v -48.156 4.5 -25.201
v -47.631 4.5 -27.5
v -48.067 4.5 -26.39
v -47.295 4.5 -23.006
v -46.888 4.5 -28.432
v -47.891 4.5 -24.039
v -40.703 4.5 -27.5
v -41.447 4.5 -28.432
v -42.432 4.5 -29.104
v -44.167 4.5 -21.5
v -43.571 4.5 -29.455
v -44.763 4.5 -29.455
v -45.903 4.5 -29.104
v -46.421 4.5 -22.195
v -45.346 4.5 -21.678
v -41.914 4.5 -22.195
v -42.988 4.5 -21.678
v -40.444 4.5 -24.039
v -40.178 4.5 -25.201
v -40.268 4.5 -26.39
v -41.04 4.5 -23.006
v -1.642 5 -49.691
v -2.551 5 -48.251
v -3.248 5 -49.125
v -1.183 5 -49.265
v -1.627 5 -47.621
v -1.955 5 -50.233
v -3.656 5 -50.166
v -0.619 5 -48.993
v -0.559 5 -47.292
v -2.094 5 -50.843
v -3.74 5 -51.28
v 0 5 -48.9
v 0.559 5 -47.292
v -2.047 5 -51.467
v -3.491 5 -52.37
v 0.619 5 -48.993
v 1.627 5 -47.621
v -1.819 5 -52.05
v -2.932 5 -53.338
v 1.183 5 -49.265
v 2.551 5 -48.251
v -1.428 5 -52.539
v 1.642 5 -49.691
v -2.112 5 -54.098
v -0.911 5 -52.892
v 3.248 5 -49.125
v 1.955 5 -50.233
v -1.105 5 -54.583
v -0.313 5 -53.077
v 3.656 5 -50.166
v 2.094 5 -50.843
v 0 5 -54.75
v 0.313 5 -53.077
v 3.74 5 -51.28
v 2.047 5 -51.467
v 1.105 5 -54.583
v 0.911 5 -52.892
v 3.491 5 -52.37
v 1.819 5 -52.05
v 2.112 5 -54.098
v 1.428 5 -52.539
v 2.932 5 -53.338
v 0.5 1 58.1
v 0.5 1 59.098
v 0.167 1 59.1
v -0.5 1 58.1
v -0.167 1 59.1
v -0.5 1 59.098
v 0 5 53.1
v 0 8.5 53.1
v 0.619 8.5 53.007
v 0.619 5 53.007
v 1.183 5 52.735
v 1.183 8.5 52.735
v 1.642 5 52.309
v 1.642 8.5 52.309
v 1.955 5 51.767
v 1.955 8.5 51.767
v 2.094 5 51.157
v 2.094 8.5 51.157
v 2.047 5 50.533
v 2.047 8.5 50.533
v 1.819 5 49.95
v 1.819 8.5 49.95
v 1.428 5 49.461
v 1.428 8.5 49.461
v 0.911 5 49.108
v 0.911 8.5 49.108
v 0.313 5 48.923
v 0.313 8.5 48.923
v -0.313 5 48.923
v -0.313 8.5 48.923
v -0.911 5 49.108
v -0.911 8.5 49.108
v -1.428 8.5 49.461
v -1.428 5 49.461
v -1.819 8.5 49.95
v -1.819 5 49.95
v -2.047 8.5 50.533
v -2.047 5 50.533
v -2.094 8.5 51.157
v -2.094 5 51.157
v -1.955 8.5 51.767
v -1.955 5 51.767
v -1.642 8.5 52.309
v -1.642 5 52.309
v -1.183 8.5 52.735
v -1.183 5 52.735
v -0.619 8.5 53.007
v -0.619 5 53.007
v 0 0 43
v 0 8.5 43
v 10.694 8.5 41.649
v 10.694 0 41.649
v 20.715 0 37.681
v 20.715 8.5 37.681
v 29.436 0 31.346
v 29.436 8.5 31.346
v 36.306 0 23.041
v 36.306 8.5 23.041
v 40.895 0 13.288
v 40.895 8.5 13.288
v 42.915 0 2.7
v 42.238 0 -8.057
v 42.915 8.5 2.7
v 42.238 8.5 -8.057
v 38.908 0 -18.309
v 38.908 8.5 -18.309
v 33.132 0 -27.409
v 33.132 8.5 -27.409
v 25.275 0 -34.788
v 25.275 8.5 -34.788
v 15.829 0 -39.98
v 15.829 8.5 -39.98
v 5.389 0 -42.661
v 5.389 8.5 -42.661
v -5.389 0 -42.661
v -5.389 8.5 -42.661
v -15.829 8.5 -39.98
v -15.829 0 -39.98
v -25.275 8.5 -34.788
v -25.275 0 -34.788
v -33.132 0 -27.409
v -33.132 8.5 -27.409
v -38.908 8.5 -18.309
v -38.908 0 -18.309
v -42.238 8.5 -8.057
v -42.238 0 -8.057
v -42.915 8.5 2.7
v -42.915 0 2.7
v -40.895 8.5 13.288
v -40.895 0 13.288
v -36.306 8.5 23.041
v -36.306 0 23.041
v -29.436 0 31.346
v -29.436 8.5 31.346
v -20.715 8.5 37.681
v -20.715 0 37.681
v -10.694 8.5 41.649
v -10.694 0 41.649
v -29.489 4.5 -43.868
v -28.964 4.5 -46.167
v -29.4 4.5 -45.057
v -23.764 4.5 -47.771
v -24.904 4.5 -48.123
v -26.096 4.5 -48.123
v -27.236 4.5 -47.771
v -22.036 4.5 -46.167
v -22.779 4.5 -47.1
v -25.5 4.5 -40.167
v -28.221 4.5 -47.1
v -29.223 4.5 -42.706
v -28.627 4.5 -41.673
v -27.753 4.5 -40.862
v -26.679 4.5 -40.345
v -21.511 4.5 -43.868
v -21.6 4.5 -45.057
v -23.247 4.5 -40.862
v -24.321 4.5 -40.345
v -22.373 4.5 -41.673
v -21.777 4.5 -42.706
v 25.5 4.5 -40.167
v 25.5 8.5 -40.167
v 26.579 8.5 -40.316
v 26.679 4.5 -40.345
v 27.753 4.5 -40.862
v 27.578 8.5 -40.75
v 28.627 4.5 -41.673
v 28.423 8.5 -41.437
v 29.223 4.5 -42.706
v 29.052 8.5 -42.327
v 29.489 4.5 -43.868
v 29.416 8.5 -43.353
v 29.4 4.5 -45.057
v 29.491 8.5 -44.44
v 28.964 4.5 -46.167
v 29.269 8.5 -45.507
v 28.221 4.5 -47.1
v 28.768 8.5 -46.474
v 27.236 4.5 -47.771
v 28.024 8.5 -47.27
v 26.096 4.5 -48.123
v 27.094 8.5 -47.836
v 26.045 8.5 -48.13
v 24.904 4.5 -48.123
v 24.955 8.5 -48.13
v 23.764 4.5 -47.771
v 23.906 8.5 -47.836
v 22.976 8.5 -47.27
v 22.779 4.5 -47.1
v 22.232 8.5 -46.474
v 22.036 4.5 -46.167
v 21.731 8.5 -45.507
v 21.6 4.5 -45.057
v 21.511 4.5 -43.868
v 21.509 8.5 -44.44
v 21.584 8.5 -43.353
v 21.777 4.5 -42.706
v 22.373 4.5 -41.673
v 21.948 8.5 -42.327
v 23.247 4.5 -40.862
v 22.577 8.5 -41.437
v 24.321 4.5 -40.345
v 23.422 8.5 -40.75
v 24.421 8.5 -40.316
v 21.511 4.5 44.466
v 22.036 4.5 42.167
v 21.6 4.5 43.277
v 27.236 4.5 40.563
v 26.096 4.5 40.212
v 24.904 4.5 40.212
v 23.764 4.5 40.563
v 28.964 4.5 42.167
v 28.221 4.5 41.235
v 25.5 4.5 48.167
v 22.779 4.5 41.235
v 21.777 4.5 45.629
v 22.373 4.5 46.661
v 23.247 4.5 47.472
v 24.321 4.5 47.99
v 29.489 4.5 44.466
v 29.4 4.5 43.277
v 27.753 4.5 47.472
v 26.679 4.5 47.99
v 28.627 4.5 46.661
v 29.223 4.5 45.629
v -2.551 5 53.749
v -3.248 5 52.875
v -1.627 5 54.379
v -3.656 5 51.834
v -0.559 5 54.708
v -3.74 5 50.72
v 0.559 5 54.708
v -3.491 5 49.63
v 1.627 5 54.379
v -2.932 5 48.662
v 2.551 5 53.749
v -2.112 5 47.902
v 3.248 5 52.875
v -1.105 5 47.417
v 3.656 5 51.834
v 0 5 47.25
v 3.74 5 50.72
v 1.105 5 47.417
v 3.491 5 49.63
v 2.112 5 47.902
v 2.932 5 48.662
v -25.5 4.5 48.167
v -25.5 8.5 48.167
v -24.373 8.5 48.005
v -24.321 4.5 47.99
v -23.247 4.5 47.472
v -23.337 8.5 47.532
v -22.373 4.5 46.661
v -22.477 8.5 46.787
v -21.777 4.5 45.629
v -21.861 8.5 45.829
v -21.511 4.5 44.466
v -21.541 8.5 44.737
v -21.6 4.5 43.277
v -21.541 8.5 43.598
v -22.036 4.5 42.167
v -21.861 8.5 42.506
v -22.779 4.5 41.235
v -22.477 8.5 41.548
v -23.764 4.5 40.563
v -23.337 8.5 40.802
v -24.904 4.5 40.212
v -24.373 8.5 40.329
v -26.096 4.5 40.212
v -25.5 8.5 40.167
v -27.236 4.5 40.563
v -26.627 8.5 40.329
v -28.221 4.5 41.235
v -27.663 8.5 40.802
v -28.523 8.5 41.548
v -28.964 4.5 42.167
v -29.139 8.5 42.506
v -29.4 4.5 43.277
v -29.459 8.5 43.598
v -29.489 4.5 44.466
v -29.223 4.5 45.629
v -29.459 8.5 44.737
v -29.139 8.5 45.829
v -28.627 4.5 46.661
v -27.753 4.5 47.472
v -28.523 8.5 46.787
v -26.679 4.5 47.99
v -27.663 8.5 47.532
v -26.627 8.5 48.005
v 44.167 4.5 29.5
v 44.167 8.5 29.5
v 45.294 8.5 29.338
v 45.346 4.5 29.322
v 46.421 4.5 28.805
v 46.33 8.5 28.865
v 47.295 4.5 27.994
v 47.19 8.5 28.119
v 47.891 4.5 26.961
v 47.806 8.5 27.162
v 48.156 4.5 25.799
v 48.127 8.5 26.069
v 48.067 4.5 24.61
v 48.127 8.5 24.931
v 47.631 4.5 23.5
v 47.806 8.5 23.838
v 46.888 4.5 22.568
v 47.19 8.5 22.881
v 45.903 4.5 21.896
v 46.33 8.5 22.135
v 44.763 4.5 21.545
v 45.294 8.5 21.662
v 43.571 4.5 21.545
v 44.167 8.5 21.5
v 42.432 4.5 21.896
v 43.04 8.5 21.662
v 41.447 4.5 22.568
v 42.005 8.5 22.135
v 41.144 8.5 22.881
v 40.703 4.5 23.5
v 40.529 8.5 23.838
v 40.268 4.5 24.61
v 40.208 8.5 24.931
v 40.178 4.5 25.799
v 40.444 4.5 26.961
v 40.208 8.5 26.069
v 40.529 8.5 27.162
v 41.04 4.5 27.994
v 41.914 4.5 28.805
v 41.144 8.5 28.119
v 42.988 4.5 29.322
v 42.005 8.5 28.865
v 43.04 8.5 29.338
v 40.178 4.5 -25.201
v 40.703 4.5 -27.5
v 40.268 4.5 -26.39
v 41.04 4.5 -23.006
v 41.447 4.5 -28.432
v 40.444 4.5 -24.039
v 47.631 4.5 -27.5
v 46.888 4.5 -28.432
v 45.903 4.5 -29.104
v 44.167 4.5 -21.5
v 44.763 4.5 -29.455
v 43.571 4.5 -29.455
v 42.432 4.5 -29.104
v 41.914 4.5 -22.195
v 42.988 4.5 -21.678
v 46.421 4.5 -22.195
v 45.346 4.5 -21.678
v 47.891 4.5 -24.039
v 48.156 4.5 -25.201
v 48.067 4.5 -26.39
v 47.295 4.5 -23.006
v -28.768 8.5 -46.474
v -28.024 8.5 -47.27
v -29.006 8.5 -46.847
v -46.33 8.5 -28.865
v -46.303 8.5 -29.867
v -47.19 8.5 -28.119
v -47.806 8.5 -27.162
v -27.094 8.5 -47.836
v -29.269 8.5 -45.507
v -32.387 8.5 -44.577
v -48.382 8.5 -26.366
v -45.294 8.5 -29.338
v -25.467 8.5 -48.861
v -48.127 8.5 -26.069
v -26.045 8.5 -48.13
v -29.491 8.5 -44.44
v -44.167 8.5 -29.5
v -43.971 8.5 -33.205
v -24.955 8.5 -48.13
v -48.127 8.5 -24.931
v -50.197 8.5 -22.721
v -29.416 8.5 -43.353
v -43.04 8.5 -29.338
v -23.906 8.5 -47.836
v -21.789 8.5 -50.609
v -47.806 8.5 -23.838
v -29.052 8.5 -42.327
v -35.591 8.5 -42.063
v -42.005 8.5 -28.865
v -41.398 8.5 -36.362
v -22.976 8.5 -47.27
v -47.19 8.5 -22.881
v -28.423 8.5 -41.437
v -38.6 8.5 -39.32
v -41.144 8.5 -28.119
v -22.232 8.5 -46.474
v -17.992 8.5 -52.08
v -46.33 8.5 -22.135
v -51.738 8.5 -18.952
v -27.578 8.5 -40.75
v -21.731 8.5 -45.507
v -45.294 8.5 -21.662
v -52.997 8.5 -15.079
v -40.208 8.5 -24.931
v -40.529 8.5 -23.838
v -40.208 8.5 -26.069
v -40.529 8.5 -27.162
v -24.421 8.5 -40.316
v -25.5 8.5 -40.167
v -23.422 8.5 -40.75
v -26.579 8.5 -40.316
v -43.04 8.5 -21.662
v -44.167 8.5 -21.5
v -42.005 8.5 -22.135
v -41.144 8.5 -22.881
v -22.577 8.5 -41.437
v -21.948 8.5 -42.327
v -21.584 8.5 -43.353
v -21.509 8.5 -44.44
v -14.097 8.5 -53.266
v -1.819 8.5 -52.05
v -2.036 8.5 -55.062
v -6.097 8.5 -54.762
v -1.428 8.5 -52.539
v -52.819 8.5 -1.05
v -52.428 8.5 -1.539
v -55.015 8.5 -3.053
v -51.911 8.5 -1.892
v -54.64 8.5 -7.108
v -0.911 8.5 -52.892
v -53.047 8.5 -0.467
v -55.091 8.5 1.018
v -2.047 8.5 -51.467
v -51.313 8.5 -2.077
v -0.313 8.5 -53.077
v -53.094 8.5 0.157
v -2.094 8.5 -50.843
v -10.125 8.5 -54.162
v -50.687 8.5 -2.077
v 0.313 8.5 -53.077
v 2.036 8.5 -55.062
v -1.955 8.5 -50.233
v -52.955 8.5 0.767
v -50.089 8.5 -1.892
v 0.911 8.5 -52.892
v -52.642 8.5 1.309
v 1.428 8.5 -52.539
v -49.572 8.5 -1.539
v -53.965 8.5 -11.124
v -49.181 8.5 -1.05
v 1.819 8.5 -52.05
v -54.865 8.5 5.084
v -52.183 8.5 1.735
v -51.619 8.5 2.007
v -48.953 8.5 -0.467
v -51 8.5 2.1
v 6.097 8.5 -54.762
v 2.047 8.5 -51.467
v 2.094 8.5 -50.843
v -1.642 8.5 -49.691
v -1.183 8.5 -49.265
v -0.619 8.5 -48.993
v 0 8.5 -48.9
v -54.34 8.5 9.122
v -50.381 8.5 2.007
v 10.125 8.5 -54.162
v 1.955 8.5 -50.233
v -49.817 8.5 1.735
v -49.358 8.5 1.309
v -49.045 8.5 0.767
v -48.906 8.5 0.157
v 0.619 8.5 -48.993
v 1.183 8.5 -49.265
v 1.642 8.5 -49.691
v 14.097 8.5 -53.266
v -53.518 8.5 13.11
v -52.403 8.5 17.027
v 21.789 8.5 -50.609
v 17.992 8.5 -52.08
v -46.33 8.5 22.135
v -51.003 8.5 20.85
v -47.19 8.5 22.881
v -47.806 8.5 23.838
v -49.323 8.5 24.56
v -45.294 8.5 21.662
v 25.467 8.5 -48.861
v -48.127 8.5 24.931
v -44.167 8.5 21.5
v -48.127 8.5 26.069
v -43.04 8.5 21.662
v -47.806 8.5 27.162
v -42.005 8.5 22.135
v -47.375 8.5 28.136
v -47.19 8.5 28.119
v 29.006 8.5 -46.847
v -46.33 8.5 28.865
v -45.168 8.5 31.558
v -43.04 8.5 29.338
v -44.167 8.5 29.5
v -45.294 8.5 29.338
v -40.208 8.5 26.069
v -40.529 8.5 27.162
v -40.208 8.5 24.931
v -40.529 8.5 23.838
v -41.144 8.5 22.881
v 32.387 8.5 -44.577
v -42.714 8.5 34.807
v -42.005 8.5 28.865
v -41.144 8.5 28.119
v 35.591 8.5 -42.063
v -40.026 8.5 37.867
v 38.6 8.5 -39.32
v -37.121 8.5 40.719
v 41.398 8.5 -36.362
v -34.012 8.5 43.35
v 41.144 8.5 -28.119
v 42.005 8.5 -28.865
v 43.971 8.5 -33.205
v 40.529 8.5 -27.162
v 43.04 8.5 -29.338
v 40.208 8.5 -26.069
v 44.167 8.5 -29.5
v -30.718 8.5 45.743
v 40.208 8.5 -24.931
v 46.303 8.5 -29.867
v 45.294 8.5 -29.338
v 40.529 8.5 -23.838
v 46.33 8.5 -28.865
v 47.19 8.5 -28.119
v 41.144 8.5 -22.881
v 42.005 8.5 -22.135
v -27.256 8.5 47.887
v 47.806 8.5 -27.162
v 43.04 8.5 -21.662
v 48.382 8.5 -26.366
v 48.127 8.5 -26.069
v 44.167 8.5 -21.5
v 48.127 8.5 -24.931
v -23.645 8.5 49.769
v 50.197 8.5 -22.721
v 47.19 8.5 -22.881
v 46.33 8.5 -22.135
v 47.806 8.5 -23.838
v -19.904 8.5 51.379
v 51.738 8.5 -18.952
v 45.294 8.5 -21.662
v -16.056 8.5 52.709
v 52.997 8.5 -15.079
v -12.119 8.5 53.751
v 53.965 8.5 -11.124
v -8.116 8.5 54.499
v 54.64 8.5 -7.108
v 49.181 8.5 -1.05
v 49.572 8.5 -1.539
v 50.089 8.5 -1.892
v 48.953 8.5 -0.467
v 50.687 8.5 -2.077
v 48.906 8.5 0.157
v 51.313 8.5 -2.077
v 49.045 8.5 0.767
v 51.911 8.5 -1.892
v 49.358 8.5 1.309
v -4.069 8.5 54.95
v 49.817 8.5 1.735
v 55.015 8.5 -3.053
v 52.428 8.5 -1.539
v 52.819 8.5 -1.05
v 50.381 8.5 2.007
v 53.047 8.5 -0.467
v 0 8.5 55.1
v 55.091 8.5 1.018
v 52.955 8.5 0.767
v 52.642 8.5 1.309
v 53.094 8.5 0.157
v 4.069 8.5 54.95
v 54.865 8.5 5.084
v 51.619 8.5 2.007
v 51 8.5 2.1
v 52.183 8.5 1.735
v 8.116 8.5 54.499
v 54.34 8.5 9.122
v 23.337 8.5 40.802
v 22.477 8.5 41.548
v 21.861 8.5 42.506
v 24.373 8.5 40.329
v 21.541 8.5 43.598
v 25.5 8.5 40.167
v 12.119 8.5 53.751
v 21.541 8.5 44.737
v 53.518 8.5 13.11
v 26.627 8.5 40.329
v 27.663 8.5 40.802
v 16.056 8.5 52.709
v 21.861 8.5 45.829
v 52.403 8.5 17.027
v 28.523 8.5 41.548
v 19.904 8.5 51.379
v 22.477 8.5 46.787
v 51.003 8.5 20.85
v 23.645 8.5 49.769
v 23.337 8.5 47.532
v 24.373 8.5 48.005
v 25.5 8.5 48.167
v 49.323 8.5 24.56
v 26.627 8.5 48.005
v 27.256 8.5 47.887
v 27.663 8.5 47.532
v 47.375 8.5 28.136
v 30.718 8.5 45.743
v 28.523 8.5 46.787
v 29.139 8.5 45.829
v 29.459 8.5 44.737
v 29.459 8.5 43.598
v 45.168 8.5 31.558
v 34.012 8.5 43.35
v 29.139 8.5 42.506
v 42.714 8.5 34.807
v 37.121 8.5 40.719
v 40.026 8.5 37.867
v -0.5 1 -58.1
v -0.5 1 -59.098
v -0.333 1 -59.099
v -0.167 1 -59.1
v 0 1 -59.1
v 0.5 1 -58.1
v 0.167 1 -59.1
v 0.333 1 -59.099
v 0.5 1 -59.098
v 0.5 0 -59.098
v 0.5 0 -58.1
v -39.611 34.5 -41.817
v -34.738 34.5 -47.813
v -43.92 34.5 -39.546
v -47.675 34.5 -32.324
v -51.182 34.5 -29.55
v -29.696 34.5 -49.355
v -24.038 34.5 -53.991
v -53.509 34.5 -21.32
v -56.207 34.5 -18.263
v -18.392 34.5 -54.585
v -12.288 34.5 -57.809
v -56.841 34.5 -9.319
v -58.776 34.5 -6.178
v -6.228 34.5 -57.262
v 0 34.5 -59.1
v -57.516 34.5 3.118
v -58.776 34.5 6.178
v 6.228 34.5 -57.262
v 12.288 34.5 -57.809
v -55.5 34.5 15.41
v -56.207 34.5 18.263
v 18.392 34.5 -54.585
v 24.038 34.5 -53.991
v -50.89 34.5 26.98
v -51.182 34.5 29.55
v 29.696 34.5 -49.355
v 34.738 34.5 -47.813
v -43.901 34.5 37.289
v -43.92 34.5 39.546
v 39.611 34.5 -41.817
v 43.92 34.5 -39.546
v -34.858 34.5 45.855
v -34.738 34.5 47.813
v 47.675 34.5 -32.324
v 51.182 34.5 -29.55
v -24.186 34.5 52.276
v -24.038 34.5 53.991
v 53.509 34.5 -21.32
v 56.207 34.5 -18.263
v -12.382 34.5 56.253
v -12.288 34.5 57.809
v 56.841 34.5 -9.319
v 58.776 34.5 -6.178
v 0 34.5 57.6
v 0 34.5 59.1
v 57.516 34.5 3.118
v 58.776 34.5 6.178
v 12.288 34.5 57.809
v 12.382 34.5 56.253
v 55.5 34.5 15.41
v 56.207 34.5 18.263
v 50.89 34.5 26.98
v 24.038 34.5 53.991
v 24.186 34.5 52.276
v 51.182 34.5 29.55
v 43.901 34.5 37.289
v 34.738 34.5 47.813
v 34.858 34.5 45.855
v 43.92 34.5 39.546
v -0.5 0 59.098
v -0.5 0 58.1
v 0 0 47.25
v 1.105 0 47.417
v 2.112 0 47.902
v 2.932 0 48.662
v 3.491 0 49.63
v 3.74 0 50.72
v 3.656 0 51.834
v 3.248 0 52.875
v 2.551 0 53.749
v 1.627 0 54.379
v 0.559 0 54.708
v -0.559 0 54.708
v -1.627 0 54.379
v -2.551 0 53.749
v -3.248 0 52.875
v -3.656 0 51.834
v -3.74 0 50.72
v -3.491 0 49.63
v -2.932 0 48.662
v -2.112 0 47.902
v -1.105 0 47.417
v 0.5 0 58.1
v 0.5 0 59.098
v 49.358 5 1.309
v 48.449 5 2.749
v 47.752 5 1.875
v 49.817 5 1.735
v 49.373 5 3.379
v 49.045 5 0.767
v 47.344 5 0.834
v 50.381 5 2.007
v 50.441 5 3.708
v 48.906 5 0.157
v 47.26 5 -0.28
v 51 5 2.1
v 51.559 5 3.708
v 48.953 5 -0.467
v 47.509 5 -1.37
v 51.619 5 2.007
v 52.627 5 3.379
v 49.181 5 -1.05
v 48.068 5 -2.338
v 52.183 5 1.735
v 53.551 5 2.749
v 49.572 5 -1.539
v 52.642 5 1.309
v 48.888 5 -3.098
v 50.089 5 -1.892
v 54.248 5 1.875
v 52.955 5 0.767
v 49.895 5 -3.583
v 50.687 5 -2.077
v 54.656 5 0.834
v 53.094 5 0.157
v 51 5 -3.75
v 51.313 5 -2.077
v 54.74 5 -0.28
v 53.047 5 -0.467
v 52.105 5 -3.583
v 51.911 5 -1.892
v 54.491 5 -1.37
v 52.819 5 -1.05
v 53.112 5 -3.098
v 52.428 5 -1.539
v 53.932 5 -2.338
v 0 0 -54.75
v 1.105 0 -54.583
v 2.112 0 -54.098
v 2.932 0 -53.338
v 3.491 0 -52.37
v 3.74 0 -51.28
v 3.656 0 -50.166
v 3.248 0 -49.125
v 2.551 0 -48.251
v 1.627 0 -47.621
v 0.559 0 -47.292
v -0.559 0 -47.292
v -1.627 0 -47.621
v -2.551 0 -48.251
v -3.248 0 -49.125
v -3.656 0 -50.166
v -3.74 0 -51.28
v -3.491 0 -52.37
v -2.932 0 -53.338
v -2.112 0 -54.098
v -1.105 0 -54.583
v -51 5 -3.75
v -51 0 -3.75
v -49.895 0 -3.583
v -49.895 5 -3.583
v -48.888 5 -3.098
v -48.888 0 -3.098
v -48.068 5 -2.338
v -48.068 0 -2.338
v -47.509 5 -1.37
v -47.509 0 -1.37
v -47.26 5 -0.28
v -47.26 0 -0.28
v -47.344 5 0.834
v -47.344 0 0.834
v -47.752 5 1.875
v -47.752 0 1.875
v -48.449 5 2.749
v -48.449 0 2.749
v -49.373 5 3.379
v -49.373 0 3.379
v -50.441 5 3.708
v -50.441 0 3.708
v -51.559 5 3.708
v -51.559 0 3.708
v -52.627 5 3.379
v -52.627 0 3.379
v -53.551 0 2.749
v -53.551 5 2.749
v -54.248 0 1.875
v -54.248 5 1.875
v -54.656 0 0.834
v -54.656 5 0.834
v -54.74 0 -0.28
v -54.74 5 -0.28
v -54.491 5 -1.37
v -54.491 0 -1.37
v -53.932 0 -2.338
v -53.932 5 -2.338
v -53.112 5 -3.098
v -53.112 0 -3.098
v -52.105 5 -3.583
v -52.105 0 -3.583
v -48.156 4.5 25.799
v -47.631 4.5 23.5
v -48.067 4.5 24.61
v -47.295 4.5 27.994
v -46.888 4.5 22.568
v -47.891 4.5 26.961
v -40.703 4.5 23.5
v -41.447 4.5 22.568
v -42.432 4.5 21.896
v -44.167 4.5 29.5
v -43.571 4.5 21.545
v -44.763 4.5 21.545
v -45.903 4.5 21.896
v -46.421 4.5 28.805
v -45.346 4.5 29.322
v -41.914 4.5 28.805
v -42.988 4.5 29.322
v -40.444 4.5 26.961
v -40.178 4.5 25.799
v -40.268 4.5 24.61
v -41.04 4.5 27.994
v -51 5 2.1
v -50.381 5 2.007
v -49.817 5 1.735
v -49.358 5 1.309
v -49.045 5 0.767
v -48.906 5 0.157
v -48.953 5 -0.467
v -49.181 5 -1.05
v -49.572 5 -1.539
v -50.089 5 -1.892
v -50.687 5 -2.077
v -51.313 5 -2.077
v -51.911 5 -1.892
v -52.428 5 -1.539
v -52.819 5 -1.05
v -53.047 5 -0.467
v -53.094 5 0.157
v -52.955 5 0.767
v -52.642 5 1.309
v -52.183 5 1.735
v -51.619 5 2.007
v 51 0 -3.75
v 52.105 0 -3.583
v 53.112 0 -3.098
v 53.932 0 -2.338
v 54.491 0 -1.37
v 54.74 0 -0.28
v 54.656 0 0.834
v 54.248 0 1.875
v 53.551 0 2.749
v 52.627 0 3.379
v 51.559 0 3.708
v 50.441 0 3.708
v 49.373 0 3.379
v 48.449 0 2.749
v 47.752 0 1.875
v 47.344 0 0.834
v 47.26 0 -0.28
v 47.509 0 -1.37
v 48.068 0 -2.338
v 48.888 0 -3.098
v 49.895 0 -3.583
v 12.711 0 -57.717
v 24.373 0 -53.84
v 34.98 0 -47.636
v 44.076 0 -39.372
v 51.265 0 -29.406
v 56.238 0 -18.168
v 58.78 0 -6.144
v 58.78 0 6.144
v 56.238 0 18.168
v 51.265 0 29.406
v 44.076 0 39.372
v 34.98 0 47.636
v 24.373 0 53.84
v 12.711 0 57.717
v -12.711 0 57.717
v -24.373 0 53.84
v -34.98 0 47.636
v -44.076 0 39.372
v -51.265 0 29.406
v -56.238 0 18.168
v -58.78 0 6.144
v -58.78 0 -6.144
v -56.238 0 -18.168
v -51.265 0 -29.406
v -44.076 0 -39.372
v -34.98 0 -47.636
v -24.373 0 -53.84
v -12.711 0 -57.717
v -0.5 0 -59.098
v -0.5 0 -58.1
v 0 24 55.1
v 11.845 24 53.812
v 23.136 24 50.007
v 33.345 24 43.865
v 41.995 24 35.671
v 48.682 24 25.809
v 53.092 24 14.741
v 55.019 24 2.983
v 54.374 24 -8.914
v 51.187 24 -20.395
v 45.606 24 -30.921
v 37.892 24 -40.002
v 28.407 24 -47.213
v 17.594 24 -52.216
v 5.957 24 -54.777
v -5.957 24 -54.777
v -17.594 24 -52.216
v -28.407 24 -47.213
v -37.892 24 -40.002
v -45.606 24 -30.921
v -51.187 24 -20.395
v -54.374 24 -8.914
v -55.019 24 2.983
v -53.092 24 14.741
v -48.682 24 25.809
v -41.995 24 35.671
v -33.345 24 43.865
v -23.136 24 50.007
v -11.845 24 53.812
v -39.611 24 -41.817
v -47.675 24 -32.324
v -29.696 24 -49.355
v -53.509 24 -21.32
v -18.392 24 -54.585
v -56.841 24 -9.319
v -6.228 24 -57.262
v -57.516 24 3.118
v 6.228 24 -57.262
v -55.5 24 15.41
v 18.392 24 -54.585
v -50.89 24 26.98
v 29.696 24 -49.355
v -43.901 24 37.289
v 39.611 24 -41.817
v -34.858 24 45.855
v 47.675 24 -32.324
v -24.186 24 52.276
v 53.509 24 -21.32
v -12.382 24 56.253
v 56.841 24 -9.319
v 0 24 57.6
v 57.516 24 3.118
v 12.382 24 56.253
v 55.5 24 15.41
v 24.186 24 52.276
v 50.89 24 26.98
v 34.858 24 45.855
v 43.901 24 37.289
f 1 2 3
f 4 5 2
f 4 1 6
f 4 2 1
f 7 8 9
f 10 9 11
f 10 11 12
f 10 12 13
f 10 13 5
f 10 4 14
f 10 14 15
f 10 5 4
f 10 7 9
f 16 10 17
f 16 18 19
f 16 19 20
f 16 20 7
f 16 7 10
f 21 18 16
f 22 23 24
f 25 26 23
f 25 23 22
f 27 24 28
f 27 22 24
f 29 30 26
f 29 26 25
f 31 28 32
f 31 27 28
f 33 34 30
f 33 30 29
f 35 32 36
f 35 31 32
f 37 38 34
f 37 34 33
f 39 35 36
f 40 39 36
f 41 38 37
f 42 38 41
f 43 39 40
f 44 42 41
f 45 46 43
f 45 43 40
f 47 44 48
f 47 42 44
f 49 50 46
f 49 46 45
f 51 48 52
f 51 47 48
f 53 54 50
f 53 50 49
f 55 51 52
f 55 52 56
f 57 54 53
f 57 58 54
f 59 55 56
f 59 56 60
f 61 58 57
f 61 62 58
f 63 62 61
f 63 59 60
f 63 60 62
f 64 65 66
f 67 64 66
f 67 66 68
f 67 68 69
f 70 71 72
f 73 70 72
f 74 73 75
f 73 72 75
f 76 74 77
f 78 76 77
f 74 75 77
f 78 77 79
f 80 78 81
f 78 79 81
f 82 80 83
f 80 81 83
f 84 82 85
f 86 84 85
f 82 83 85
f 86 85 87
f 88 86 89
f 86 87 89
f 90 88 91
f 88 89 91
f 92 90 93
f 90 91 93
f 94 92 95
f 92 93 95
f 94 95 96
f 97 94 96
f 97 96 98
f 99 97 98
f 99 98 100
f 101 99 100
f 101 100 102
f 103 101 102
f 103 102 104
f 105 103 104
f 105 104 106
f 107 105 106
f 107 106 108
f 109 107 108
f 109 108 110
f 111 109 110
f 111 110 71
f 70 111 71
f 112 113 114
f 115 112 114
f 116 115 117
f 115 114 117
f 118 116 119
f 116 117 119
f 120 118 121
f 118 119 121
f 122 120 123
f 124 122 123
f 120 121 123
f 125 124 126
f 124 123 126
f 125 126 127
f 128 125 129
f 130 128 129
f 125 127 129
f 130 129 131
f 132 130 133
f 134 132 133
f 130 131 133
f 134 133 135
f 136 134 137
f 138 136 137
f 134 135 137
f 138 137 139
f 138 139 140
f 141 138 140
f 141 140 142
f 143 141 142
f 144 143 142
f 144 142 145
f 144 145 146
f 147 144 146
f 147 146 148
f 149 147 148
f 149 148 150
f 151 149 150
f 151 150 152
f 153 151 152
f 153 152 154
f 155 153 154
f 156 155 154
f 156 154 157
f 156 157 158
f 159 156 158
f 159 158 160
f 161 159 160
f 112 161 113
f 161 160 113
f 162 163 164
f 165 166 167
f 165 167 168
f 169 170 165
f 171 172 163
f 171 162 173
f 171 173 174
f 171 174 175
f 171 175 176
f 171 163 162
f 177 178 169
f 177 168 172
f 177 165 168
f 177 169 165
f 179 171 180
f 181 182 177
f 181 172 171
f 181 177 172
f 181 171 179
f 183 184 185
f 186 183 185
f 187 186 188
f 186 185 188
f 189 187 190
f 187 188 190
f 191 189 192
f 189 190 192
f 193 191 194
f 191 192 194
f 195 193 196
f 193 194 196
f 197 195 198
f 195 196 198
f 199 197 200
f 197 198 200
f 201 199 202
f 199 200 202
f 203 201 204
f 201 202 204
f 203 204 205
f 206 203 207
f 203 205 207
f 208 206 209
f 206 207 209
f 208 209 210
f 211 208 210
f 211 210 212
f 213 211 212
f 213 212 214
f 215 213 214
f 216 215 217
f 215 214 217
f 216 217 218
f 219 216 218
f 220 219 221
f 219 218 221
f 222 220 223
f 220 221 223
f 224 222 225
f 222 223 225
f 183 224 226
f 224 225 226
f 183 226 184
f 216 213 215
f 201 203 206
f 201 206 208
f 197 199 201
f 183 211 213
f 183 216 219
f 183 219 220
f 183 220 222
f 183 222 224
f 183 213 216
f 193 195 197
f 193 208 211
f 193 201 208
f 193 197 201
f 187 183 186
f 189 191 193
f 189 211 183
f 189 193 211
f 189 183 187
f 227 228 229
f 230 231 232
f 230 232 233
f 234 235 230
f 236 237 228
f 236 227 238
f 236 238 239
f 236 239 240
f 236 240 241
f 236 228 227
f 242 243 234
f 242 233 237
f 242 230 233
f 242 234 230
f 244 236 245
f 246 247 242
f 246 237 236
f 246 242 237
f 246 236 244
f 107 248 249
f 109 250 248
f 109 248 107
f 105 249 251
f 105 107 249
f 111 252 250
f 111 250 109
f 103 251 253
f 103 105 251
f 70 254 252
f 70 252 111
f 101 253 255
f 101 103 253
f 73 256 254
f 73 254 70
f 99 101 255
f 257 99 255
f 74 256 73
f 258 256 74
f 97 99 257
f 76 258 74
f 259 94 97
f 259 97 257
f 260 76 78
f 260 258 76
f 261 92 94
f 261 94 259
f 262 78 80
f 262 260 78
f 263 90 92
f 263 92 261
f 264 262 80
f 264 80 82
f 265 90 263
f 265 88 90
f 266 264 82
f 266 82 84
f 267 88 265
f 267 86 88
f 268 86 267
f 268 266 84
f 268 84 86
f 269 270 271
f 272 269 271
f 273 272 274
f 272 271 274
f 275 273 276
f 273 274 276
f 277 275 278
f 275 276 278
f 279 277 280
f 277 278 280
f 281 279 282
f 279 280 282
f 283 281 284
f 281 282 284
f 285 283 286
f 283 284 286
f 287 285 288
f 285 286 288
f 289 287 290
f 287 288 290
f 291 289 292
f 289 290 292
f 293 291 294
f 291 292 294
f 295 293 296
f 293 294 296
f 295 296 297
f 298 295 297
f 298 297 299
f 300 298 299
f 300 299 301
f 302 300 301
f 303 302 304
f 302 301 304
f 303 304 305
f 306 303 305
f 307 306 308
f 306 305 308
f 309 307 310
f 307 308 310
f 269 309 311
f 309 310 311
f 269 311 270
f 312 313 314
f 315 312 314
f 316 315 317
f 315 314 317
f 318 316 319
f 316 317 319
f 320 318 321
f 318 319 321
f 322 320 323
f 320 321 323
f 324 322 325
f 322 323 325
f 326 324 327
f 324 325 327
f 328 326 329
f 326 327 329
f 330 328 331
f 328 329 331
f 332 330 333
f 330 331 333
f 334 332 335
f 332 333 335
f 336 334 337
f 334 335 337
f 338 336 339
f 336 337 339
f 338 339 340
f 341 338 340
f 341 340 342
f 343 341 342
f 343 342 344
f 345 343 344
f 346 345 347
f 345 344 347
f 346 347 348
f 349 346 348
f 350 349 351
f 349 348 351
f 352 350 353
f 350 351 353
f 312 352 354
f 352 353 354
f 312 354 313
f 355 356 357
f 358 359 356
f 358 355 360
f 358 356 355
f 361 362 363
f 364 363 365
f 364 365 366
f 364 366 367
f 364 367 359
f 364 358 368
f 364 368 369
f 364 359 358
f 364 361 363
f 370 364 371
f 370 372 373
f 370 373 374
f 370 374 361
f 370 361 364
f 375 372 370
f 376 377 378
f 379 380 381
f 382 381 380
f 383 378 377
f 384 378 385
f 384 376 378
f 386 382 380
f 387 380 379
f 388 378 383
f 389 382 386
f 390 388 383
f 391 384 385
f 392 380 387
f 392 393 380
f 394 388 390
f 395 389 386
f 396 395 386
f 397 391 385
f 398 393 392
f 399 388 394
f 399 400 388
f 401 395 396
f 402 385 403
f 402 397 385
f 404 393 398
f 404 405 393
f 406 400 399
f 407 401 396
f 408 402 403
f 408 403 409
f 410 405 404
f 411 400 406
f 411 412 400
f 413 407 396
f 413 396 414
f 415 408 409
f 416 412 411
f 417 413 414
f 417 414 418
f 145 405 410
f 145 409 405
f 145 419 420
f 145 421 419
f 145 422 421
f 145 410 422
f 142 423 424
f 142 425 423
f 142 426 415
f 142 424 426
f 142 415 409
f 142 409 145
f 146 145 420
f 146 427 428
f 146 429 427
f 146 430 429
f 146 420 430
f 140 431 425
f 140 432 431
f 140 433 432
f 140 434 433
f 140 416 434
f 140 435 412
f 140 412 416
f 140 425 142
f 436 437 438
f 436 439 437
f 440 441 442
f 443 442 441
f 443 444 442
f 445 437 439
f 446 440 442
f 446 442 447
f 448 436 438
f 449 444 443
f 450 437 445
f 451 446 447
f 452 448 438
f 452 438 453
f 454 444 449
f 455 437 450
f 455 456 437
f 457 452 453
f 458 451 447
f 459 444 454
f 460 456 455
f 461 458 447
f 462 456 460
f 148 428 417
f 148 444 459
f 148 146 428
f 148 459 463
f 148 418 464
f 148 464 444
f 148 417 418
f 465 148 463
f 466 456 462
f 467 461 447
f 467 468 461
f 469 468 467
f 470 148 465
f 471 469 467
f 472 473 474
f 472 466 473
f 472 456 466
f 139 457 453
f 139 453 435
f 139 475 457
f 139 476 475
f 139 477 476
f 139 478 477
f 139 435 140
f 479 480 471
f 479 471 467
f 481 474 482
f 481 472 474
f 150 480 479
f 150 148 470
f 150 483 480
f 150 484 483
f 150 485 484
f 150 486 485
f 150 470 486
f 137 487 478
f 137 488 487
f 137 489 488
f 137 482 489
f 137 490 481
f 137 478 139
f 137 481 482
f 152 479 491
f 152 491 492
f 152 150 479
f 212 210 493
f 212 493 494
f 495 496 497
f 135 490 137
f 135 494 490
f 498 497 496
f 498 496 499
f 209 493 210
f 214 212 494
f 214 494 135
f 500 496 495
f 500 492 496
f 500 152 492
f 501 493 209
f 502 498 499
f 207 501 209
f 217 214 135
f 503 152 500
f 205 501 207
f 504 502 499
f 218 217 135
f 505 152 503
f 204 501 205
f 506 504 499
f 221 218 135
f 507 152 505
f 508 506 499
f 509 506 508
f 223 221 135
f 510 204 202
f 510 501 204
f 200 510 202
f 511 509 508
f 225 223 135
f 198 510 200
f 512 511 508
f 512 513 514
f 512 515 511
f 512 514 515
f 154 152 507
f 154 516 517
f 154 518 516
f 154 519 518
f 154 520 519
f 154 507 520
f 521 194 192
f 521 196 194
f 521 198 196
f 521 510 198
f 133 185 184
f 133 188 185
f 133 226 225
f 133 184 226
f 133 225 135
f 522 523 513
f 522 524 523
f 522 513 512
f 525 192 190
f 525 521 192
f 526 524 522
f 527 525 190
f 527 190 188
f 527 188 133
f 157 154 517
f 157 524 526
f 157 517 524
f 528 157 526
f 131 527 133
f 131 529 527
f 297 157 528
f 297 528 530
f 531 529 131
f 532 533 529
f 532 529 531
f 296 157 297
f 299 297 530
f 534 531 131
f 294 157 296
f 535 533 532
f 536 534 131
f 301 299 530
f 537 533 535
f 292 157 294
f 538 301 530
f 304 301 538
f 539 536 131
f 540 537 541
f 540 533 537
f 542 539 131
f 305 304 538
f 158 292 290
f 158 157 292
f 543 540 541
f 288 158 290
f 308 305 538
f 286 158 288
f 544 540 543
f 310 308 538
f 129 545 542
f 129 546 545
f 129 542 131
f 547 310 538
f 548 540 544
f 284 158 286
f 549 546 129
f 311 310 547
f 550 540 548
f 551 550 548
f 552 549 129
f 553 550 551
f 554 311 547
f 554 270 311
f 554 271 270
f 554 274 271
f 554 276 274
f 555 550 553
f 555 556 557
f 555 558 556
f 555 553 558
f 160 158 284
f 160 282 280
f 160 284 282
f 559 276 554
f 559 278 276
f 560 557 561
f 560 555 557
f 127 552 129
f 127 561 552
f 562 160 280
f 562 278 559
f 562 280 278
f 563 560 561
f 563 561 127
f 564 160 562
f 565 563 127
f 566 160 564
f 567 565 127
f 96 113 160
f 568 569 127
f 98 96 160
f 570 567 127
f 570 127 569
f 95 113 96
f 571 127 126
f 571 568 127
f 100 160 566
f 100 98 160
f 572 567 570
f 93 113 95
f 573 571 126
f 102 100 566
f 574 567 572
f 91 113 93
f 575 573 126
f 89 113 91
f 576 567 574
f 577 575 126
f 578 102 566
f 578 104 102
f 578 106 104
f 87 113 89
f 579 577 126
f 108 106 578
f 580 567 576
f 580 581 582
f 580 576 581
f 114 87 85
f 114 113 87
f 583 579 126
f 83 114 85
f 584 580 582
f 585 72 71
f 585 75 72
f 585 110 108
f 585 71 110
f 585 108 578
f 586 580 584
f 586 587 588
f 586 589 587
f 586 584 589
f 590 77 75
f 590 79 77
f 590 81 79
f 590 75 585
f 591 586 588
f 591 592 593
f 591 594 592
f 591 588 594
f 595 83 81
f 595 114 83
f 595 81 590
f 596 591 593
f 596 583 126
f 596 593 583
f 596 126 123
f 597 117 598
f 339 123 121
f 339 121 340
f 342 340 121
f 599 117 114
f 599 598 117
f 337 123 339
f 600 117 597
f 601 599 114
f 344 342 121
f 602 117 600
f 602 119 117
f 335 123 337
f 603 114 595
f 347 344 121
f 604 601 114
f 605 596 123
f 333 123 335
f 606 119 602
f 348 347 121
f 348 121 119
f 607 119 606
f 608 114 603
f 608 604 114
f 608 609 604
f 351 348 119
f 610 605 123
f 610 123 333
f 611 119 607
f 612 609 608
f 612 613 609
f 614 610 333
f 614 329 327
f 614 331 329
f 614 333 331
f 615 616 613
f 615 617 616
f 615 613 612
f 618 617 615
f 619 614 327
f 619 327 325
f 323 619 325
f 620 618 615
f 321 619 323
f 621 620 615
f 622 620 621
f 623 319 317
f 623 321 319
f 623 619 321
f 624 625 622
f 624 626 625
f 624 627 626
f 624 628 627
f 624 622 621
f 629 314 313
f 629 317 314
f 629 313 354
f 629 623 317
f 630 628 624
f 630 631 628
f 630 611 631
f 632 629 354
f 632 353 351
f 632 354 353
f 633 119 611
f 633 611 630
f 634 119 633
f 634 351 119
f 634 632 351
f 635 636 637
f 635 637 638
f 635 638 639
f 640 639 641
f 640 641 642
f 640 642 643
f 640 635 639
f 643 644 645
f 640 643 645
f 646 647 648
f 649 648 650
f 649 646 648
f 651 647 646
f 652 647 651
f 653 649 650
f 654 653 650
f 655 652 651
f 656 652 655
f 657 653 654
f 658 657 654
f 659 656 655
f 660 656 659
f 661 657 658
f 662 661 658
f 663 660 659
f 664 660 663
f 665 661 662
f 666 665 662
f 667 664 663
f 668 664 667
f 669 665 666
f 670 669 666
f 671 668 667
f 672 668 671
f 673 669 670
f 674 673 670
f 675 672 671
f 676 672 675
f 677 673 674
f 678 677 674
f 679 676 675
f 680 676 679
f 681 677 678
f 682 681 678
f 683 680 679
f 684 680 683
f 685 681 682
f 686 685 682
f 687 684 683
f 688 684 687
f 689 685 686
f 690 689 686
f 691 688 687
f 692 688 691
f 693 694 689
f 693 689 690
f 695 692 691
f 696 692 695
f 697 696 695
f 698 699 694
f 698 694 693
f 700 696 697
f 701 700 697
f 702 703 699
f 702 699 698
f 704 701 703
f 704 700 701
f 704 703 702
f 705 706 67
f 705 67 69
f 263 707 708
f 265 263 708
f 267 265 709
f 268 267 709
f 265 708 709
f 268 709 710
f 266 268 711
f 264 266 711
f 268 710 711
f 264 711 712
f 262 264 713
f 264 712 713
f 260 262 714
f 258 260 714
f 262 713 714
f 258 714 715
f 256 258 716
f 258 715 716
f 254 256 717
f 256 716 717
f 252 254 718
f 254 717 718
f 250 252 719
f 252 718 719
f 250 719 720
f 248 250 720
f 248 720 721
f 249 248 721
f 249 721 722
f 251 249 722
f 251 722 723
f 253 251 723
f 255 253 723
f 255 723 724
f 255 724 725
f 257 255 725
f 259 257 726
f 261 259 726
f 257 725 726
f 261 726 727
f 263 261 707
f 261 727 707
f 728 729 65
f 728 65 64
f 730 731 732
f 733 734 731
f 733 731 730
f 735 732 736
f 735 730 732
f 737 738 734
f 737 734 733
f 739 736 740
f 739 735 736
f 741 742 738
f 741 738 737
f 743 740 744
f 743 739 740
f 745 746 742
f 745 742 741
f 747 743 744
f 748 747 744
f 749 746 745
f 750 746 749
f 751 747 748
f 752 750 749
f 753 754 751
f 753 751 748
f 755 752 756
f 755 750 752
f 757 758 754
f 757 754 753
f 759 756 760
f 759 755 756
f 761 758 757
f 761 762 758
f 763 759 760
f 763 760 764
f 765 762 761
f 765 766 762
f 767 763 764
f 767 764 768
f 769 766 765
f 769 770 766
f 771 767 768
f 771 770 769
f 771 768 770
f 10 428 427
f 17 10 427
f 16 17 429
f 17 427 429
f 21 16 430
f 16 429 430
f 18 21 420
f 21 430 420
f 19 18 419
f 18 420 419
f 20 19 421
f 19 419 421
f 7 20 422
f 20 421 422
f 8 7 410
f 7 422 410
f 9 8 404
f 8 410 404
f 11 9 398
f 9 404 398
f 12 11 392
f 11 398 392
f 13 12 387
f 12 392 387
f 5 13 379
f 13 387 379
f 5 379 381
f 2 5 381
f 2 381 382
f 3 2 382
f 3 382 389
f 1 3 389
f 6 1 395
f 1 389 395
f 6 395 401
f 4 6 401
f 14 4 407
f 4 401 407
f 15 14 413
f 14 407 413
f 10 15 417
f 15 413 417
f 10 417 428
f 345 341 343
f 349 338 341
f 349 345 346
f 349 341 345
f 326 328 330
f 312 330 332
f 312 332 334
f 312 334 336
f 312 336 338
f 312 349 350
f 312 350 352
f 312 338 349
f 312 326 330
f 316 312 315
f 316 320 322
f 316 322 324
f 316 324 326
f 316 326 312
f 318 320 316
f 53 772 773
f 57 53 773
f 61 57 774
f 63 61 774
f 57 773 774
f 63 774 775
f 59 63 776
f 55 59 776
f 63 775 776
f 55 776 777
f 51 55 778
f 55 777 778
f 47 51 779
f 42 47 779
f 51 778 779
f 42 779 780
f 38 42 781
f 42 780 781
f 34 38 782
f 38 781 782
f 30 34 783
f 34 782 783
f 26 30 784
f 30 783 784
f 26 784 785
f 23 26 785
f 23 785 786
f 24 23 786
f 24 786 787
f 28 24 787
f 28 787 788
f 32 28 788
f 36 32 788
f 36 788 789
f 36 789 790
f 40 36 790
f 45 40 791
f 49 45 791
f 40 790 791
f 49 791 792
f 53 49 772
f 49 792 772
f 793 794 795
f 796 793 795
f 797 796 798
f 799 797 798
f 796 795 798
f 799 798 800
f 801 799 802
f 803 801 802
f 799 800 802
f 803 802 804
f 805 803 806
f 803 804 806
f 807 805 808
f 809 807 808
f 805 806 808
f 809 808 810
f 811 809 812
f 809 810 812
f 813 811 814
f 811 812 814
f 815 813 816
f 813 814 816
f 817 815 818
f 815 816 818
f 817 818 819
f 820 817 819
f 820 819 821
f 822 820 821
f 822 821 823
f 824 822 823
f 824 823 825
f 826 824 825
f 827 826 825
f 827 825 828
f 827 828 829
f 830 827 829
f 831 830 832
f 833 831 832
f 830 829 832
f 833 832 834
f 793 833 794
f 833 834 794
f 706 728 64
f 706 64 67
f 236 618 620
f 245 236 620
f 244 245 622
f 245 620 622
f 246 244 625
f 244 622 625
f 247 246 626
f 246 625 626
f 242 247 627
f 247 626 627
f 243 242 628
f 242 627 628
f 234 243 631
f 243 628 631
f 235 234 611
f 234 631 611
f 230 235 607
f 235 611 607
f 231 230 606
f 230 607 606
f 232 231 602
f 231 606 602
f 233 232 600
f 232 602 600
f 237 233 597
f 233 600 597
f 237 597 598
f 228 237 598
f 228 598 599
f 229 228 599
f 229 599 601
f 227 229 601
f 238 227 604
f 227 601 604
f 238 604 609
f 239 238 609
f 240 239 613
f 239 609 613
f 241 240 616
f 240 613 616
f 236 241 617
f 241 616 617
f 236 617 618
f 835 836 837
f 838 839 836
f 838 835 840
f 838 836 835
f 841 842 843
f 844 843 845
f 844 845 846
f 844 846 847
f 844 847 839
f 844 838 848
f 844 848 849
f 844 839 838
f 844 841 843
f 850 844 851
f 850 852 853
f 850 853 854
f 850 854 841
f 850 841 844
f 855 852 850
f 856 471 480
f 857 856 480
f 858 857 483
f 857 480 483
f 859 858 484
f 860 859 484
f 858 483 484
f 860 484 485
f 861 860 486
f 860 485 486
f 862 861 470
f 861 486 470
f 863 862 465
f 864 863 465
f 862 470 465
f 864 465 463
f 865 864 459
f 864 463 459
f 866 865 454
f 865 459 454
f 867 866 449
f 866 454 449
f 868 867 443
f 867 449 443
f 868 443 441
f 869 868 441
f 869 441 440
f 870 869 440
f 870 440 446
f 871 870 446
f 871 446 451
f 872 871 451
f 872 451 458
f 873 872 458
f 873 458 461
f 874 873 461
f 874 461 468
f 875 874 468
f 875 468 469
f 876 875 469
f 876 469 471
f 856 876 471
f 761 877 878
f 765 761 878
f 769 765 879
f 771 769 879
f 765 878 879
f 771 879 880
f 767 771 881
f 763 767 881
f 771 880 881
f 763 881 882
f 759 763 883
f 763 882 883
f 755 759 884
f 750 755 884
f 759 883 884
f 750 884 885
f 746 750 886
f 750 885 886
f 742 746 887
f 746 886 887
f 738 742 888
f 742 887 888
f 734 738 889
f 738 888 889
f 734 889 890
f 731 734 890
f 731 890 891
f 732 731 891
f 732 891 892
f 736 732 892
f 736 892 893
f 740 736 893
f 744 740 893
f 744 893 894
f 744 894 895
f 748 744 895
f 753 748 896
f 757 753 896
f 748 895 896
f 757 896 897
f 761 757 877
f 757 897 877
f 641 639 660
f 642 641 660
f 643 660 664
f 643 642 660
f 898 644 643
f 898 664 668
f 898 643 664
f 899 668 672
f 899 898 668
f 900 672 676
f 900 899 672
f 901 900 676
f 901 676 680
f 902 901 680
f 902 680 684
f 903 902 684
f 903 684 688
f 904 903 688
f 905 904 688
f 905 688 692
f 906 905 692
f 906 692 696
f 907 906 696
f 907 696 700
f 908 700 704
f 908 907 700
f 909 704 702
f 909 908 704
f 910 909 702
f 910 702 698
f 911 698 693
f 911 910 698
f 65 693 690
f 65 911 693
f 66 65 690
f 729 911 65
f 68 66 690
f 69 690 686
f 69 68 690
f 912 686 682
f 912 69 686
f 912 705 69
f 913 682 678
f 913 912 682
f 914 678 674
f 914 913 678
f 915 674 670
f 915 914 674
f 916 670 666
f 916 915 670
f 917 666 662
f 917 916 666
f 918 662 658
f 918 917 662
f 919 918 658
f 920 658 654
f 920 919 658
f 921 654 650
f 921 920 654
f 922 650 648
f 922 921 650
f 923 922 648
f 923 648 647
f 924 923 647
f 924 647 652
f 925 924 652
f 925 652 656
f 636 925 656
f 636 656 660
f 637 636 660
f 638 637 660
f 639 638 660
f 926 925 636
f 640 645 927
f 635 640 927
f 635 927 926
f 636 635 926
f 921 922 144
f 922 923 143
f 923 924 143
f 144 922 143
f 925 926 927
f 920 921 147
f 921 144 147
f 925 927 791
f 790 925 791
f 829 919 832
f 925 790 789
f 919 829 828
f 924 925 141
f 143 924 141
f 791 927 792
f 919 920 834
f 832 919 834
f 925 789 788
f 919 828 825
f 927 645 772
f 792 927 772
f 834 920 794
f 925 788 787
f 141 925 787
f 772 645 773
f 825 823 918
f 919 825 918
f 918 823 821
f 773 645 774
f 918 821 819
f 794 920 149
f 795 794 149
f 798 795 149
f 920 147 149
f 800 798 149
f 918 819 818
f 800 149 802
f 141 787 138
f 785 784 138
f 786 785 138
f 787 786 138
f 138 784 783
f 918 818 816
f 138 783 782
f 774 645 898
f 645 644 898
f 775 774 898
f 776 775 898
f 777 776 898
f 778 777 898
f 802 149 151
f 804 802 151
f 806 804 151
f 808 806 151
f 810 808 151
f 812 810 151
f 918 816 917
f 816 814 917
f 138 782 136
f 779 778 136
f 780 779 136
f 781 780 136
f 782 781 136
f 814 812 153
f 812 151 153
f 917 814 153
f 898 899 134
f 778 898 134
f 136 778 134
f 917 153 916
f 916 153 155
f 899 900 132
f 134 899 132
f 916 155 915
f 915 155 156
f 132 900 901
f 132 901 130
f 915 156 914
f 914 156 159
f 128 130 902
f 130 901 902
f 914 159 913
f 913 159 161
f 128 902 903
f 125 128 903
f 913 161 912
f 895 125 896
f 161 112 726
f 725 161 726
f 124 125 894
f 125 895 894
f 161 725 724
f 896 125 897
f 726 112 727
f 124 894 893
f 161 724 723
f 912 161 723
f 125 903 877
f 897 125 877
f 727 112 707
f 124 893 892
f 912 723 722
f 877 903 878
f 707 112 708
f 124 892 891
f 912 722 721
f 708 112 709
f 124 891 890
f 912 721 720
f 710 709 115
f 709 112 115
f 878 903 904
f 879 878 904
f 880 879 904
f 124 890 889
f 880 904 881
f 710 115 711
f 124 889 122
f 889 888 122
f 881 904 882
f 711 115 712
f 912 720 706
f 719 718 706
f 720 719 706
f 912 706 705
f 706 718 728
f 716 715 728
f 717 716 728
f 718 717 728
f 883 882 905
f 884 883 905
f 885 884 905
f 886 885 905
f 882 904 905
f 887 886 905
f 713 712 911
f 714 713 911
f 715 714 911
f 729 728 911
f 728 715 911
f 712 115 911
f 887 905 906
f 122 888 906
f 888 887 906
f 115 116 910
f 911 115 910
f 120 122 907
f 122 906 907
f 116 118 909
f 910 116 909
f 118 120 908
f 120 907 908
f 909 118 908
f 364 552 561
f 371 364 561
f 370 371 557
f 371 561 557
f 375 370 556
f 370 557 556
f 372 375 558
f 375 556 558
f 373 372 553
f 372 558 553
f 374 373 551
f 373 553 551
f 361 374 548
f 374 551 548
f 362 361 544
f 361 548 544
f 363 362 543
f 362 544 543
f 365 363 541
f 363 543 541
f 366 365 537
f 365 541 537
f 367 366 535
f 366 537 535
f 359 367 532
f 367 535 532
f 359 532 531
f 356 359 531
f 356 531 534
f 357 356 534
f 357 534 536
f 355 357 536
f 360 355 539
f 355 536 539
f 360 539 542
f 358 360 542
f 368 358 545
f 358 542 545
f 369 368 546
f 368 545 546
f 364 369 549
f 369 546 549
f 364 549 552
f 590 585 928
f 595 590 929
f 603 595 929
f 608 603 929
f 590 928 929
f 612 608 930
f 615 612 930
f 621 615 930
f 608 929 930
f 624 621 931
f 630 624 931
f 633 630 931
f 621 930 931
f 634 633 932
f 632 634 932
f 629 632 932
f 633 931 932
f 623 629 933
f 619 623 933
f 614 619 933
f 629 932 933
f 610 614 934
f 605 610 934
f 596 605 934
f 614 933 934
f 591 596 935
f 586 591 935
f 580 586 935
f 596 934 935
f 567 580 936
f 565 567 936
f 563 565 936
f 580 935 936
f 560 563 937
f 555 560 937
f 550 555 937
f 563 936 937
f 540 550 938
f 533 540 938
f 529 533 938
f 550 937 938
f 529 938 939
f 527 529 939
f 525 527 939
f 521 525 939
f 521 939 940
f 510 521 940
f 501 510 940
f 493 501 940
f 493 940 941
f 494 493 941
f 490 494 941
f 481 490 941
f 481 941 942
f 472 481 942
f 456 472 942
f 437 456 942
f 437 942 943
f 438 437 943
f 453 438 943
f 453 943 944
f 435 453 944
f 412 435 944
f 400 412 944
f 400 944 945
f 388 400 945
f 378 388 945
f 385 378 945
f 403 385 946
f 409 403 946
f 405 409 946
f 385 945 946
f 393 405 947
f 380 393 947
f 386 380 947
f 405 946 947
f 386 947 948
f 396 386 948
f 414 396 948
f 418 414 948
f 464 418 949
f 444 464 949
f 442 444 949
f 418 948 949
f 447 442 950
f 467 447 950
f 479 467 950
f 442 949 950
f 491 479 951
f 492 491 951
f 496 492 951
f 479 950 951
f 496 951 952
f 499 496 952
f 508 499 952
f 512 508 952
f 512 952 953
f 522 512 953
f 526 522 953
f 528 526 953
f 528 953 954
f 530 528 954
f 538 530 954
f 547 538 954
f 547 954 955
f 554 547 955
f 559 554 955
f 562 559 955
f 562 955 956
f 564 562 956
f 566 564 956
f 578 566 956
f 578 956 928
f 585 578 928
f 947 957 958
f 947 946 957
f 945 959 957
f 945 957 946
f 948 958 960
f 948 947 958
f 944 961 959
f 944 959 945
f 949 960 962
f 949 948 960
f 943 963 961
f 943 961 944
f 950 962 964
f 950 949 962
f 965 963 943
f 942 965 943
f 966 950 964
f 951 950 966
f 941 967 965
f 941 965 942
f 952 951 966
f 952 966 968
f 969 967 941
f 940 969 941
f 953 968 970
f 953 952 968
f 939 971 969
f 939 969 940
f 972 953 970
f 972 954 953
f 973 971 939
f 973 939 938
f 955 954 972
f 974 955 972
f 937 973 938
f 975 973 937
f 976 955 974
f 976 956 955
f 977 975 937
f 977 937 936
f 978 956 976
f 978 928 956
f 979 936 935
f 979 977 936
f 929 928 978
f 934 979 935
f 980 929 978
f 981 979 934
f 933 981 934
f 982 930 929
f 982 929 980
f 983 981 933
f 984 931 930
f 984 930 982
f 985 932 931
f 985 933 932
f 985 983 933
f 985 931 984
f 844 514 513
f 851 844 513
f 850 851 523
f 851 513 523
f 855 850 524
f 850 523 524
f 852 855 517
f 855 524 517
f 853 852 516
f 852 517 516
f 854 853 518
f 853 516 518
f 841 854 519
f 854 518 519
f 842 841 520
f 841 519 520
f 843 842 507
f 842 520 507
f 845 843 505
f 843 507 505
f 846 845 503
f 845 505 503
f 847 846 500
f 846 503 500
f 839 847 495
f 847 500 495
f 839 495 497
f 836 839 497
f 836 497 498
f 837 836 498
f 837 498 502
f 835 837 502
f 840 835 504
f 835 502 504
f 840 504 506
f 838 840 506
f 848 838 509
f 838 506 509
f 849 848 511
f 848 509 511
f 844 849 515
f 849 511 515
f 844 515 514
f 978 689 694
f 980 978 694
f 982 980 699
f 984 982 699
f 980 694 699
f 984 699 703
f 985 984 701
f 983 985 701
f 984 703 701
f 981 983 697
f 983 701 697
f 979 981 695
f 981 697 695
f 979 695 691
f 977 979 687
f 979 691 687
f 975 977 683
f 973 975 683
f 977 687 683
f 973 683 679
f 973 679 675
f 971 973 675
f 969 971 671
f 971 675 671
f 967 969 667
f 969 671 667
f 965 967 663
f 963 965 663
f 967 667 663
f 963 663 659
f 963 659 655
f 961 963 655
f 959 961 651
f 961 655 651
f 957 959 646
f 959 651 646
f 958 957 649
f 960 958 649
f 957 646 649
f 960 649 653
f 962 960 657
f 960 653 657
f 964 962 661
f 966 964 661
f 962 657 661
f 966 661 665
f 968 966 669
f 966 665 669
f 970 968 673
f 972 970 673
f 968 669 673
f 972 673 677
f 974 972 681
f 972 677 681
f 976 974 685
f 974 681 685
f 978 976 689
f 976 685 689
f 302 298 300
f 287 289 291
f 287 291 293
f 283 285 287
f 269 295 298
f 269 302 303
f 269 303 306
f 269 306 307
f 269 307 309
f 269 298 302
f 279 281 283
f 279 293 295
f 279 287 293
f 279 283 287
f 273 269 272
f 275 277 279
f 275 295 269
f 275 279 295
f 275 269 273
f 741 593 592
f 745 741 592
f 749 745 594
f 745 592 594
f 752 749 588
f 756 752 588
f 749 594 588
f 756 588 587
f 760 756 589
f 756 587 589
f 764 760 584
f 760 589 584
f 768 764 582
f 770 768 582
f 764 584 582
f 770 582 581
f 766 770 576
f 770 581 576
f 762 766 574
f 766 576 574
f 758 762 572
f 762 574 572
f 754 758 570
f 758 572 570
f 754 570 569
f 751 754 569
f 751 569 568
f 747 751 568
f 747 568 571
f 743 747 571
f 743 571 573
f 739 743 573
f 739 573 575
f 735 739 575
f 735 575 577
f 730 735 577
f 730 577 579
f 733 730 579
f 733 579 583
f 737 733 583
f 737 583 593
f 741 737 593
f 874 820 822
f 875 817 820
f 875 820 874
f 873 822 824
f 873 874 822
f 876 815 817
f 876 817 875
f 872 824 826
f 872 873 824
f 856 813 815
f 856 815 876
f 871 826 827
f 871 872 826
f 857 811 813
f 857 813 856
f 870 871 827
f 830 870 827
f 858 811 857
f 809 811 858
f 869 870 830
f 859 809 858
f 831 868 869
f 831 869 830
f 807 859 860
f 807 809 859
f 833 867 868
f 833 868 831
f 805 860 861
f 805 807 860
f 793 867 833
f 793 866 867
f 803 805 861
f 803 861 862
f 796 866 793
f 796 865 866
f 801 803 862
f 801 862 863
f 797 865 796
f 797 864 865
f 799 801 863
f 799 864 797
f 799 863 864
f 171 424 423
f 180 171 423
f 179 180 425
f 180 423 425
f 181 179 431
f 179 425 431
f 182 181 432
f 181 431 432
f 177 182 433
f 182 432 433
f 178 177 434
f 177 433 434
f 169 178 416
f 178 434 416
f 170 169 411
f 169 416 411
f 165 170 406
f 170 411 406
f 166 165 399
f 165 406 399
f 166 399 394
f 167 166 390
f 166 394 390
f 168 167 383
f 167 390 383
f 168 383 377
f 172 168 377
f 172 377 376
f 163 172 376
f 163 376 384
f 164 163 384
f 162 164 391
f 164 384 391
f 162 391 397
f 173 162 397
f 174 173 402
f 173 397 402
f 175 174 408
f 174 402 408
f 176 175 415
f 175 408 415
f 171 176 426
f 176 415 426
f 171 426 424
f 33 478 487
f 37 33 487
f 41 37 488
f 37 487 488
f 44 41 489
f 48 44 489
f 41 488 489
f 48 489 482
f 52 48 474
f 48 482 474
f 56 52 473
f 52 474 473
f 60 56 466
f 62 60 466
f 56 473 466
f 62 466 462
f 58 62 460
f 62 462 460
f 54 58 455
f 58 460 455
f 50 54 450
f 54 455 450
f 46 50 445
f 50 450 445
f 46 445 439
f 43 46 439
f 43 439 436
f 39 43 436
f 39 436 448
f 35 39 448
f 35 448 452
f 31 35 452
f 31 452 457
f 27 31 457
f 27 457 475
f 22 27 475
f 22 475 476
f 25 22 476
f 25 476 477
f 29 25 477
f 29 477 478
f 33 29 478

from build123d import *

# Parameters (mm, degrees)
SKETCH_1_R           = 59.5
EXTRUDE_1_DEPTH      = 34.5
SKETCH_2_R           = 57.6
CUT_EXTRUDE_1_DEPTH  = 10.5
SKETCH_3_R           = 55.1
CUT_EXTRUDE_2_DEPTH  = 15.5
SKETCH_4_R           = 43
CUT_EXTRUDE_3_DEPTH  = 89.07099409
SKETCH_9_R           = 4
CUT_EXTRUDE_7_DEPTH  = 4
SKETCH_10_R          = 2.1
CUT_EXTRUDE_8_DEPTH  = 89.07099409
SKETCH_11_R          = 3.75
CUT_EXTRUDE_9_DEPTH  = 5
SKETCH_14_R          = 59.5
SKETCH_14_R_2        = 59.1
CUT_EXTRUDE_12_DEPTH = 91.94366388
CUT_EXTRUDE_13_DEPTH = 1


with BuildPart() as part:
    # 草图1 → 凸台-拉伸1 (new body)
    with BuildSketch(Plane(origin=(0, 0, 0), x_dir=(1, 0, 0), z_dir=(0, 1, 0))):
        with Locations(Location((0, 0, 0), (0, 0, 270))):
            Circle(SKETCH_1_R)
    extrude(amount=EXTRUDE_1_DEPTH)

    # 草图2 → 切除-拉伸1 (cut)
    with BuildSketch(Plane(origin=(0, 34.5, 0), x_dir=(1, 0, 0), z_dir=(0, 1, 0))):
        with Locations(Location((0, 0, 0), (0, 0, 270))):
            Circle(SKETCH_2_R)
    extrude(amount=-CUT_EXTRUDE_1_DEPTH, mode=Mode.SUBTRACT)

    # 草图3 → 切除-拉伸2 (cut)
    with BuildSketch(Plane(origin=(0, 24, 0), x_dir=(1, 0, 0), z_dir=(0, 1, 0))):
        with Locations(Location((0, 0, 0), (0, 0, 270))):
            Circle(SKETCH_3_R)
    extrude(amount=-CUT_EXTRUDE_2_DEPTH, mode=Mode.SUBTRACT)

    # 草图4 → 切除-拉伸3 (cut, through all)
    with BuildSketch(Plane(origin=(0, 8.5, 0), x_dir=(1, 0, 0), z_dir=(0, 1, 0))):
        with Locations(Location((0, 0, 0), (0, 0, 270))):
            Circle(SKETCH_4_R)
    extrude(amount=-CUT_EXTRUDE_3_DEPTH, mode=Mode.SUBTRACT)

    # 草图9 → 切除-拉伸7 (cut)
    with BuildSketch(Plane(origin=(0, 8.5, 0), x_dir=(1, 0, 0), z_dir=(0, 1, 0))):
        with Locations(Location((-44.167295593, 25.5, 0), (0, 0, 270))):
            Circle(SKETCH_9_R)
        with Locations(Location((-25.5, 44.167295593, 0), (0, 0, 270))):
            Circle(SKETCH_9_R)
        with Locations(Location((25.5, 44.167295593, 0), (0, 0, 270))):
            Circle(SKETCH_9_R)
        with Locations(Location((44.167295593, 25.5, 0), (0, 0, 270))):
            Circle(SKETCH_9_R)
        with Locations(Location((44.167295593, -25.5, 0), (0, 0, 270))):
            Circle(SKETCH_9_R)
        with Locations(Location((25.5, -44.167295593, 0), (0, 0, 270))):
            Circle(SKETCH_9_R)
        with Locations(Location((-25.5, -44.167295593, 0), (0, 0, 270))):
            Circle(SKETCH_9_R)
        with Locations(Location((-44.167295593, -25.5, 0), (0, 0, 270))):
            Circle(SKETCH_9_R)
    extrude(amount=-CUT_EXTRUDE_7_DEPTH, mode=Mode.SUBTRACT)

    # 草图10 → 切除-拉伸8 (cut, through all)
    with BuildSketch(Plane(origin=(0, 8.5, 0), x_dir=(1, 0, 0), z_dir=(0, 1, 0))):
        with Locations(Location((0, 51, 0), (0, 0, 270))):
            Circle(SKETCH_10_R)
        with Locations(Location((51, 0, 0), (0, 0, 270))):
            Circle(SKETCH_10_R)
        with Locations(Location((0, -51, 0), (0, 0, 270))):
            Circle(SKETCH_10_R)
        with Locations(Location((-51, 0, 0), (0, 0, 270))):
            Circle(SKETCH_10_R)
    extrude(amount=-CUT_EXTRUDE_8_DEPTH, mode=Mode.SUBTRACT)

    # 草图11 → 切除-拉伸9 (cut)
    with BuildSketch(Plane.XZ):
        with Locations(Location((0, 51, 0), (0, 0, 270))):
            Circle(SKETCH_11_R)
        with Locations(Location((51, 0, 0), (0, 0, 270))):
            Circle(SKETCH_11_R)
        with Locations(Location((0, -51, 0), (0, 0, 270))):
            Circle(SKETCH_11_R)
        with Locations(Location((-51, 0, 0), (0, 0, 270))):
            Circle(SKETCH_11_R)
    extrude(amount=-CUT_EXTRUDE_9_DEPTH, mode=Mode.SUBTRACT)

    # 草图14 → 切除-拉伸12 (cut, through all)
    with BuildSketch(Plane.XZ):
        Circle(SKETCH_14_R)
        with Locations(Location((0, 0, 0), (0, 0, 270))):
            Circle(SKETCH_14_R_2, mode=Mode.SUBTRACT)
    extrude(amount=-CUT_EXTRUDE_12_DEPTH, mode=Mode.SUBTRACT)

    # 草图15 → 切除-拉伸13 (cut)
    with BuildSketch(Plane.XZ):
        Polygon((0, -59.1), (0.5, -59.1), (0.5, -58.1), (-0.5, -58.1), (-0.5, -59.1), align=None)
        Polygon((0.5, 59.1), (0.5, 58.1), (-0.5, 58.1), (-0.5, 59.1), (0, 59.1), align=None)
    extrude(amount=-CUT_EXTRUDE_13_DEPTH, mode=Mode.SUBTRACT)


solid = part.part
